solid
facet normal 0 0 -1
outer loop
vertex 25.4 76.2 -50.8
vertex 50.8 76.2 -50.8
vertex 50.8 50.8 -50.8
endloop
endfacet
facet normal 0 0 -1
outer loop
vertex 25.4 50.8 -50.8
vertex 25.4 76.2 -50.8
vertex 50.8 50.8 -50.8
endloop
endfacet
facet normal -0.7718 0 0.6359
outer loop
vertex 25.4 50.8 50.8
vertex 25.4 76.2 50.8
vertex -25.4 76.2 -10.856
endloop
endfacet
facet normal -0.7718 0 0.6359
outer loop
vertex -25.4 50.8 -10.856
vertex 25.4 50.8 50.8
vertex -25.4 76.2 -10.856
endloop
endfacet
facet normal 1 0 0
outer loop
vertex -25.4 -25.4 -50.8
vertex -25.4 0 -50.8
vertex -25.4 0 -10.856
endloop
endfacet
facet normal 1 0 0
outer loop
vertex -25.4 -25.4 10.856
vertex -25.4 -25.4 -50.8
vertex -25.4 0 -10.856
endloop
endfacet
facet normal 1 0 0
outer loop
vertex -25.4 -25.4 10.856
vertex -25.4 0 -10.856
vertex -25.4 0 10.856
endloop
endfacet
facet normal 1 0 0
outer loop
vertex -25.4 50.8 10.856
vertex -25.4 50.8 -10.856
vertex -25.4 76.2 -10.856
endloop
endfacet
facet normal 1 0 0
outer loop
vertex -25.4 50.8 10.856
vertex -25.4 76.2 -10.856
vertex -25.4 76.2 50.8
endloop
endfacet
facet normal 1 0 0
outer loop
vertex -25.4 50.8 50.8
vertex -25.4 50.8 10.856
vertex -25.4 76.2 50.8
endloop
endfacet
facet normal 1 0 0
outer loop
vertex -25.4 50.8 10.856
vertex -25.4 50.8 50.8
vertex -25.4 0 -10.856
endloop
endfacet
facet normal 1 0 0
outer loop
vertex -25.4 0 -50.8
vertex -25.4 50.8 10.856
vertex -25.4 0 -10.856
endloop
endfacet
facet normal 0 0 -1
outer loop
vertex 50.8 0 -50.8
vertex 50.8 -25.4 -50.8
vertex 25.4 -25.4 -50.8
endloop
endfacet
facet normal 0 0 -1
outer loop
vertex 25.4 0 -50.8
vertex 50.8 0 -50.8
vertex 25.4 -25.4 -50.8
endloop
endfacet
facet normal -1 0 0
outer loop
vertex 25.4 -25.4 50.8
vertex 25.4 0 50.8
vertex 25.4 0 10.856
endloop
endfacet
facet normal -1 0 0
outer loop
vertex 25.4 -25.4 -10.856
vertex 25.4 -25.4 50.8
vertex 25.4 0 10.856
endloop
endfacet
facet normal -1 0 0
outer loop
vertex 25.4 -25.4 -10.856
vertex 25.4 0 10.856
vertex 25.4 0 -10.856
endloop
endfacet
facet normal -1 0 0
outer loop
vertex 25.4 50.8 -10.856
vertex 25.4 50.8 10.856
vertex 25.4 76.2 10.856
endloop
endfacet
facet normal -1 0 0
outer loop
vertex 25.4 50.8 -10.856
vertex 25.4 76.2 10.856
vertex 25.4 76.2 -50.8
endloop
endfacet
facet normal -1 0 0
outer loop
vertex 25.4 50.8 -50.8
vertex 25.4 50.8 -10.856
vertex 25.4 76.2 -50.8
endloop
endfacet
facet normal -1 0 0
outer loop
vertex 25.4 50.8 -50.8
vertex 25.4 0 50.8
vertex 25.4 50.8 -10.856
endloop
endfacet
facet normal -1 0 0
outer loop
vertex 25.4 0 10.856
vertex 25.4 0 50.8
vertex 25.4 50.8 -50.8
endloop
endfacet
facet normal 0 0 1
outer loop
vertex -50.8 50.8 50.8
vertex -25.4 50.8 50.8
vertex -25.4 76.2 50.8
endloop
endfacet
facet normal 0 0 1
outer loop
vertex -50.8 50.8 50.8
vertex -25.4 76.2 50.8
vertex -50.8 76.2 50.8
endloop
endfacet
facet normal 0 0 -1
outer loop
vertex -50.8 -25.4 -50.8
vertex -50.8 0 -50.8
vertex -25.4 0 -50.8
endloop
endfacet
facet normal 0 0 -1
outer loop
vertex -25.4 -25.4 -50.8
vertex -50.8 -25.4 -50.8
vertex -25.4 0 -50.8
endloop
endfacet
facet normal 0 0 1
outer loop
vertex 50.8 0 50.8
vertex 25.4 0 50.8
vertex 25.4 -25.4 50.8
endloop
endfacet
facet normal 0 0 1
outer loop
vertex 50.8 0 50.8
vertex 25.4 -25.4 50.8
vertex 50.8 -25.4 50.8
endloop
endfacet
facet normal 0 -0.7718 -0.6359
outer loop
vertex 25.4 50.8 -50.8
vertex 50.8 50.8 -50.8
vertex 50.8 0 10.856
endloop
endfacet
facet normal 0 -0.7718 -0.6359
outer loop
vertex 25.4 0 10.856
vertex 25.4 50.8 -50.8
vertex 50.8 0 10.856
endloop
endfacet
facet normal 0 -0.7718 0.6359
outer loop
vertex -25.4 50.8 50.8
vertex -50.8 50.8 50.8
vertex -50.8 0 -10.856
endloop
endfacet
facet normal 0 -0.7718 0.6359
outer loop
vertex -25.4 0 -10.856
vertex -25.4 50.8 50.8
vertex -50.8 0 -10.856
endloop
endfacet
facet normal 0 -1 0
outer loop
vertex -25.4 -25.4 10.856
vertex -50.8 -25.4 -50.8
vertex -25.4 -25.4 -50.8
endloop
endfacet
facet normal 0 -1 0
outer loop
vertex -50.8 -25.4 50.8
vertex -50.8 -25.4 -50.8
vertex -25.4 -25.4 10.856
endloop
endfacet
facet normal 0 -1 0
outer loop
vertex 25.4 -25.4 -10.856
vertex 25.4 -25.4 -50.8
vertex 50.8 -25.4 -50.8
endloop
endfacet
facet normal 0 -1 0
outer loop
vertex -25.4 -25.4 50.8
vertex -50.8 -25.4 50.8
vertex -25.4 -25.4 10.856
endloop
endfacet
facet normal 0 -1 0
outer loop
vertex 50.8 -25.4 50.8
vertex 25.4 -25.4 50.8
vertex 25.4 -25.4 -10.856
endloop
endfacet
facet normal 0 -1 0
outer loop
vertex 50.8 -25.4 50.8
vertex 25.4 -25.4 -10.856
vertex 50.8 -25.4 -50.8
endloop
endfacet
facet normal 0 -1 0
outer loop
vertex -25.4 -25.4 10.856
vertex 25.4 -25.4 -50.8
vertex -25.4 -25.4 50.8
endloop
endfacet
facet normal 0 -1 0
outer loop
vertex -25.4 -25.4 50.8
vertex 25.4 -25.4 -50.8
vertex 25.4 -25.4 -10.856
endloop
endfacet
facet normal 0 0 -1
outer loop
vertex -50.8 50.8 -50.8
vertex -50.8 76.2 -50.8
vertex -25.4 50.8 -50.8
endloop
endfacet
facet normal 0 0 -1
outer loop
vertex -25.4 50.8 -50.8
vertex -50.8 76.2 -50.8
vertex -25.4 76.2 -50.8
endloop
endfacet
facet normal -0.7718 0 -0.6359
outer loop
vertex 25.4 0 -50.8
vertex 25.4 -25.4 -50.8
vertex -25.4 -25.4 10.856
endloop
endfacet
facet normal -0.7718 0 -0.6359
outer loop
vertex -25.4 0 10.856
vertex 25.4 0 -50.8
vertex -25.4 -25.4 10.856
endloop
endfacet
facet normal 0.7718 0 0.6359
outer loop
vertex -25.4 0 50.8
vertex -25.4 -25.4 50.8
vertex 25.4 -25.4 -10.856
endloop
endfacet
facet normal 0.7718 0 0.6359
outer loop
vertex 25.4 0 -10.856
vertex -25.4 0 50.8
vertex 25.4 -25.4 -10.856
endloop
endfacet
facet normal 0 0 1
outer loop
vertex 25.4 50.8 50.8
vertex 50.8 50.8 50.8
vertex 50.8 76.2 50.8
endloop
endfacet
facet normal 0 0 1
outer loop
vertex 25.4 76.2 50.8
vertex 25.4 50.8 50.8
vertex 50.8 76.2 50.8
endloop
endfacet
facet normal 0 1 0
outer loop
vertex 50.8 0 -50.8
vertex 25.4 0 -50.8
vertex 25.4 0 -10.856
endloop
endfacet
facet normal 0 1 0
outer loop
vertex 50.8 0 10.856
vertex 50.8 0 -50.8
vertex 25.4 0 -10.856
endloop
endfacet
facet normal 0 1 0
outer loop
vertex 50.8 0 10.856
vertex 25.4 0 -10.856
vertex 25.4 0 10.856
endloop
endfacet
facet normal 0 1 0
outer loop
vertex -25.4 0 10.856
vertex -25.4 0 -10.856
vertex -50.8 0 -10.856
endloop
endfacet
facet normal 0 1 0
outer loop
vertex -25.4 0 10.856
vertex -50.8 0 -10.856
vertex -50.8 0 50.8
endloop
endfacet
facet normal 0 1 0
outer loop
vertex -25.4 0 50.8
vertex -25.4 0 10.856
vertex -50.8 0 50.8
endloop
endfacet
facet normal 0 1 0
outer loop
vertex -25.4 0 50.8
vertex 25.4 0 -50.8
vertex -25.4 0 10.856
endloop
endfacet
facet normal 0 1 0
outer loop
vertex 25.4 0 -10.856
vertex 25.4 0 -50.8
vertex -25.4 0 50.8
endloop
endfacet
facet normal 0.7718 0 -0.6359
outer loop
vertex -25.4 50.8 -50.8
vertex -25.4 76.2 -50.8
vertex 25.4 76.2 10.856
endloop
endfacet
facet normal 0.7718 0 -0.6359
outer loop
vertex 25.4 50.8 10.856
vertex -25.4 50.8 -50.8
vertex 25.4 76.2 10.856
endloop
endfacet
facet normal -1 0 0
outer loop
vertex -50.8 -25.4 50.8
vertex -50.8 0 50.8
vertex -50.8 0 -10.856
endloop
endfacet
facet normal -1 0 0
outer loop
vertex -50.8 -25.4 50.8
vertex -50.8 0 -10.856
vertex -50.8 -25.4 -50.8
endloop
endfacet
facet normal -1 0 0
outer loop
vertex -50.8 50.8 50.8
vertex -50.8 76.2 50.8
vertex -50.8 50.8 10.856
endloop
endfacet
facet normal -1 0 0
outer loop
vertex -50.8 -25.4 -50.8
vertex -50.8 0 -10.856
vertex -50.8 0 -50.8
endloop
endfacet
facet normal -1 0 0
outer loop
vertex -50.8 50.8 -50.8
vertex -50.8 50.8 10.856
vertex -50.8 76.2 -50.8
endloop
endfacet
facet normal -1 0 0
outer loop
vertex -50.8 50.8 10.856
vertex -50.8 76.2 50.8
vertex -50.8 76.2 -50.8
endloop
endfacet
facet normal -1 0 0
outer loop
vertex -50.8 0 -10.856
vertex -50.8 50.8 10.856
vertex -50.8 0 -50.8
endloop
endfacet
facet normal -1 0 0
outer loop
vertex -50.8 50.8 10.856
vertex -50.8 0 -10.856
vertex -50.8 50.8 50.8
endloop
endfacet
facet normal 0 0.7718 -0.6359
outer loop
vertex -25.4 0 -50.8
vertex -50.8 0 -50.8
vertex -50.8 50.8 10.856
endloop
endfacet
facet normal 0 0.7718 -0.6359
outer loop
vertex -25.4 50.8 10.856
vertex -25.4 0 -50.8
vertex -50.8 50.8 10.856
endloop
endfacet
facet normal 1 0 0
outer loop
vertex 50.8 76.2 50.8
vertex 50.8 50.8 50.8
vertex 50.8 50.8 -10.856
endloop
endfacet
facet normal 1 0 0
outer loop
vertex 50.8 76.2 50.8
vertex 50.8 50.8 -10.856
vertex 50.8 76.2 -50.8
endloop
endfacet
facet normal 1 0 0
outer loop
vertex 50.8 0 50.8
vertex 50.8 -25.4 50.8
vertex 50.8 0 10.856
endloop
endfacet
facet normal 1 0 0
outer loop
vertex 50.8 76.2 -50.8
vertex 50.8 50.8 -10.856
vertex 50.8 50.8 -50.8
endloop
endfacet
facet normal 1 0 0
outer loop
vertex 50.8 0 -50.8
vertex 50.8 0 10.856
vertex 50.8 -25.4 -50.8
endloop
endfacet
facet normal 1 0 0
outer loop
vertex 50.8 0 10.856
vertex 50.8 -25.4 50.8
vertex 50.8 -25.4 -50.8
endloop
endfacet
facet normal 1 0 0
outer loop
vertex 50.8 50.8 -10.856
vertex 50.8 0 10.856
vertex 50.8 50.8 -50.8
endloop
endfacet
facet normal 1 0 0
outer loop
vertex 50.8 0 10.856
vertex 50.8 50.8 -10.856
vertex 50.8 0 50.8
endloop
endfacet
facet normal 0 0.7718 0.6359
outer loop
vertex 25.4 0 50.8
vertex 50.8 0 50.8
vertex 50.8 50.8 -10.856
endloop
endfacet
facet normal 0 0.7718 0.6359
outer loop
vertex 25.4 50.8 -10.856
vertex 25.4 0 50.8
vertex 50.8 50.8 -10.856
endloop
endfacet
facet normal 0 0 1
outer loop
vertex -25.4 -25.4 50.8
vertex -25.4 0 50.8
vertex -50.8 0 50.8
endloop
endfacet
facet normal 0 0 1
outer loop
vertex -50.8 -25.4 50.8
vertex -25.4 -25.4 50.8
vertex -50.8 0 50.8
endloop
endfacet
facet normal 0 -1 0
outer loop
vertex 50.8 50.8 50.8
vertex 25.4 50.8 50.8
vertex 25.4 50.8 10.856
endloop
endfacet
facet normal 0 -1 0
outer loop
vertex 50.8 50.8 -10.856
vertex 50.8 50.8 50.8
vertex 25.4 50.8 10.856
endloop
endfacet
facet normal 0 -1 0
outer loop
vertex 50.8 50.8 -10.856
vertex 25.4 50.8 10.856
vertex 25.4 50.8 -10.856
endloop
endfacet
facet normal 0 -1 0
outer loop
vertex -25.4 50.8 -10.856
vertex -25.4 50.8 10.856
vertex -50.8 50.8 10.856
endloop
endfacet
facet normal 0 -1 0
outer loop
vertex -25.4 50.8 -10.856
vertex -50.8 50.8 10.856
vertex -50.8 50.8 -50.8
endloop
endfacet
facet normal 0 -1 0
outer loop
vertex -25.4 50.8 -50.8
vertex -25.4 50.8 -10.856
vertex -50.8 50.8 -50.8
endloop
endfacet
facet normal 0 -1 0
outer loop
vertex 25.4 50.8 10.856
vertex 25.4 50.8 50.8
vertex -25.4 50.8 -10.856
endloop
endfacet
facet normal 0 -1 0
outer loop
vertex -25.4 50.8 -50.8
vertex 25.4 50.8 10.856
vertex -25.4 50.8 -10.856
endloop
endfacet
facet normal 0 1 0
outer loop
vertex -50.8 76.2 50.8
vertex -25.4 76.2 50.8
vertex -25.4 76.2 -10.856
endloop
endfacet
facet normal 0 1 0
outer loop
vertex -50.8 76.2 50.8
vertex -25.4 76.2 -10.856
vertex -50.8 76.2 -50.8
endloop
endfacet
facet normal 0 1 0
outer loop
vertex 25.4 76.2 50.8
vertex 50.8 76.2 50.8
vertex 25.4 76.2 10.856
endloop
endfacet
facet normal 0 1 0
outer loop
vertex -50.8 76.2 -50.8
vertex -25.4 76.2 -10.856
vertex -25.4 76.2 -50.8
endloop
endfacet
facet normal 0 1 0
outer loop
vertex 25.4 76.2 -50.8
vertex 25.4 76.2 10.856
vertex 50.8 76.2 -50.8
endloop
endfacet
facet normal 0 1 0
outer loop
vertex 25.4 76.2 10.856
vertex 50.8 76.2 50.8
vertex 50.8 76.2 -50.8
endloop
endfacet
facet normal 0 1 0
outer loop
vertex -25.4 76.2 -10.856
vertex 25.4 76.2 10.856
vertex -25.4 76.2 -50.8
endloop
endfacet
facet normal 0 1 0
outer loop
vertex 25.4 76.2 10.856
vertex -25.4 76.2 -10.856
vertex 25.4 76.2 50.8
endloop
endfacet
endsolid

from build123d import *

# Parameters (mm, degrees)
F0_W      = 101.6
F0_H      = 101.6
F1_DEPTH  = 25.4
F3_DEPTH  = 25.401
F5_DEPTH  = 76.2
F7_DEPTH  = 25.4
F9_DEPTH  = 76.2
F11_DEPTH = 25.4
F13_DEPTH = 50.8
F15_DEPTH = 25.4


with BuildPart() as f1:
    # F0 (on Front) → F1 (new body)
    with BuildSketch(Plane.XZ):
        Rectangle(F0_W, F0_H)
    extrude(amount=F1_DEPTH)

    # F2 (on face) → F3 (cut, through all)
    with BuildSketch(Plane.XZ.offset(25.4)):
        Polygon((25.4, 50.8), (-25.4, 50.8), (25.4, -10.855978), align=None)
        Polygon((-25.4, 10.855978), (-25.4, -50.8), (25.4, -50.8), align=None)
    extrude(amount=-F3_DEPTH, mode=Mode.SUBTRACT)

    # F4 (on face) → F5 (join)
    with BuildSketch(Plane(origin=(0, 0, 0), x_dir=(-1, 0, 0), z_dir=(0, 1, 0))):
        Polygon((-25.4, 50.8), (-50.8, 50.8), (-50.8, -50.8), (-25.4, -50.8), (-25.4, -10.855978), align=None)
    extrude(amount=F5_DEPTH)

    # F6 (on face) → F7 (cut)
    with BuildSketch(Plane.YZ.offset(50.8)):
        Polygon((50.8, 50.8), (0, 50.8), (50.8, -10.855978), align=None)
        Polygon((0, 10.855978), (0, -50.8), (50.8, -50.8), align=None)
    extrude(amount=-F7_DEPTH, mode=Mode.SUBTRACT)

    # F8 (on face) → F9 (join)
    with BuildSketch(Plane(origin=(25.4, 0, 0), x_dir=(0, -1, 0), z_dir=(-1, 0, 0))):
        Polygon((-50.8, -10.855978), (-50.8, 50.8), (-76.2, 50.8), (-76.2, -50.8), (-50.8, -50.8), align=None)
    extrude(amount=F9_DEPTH)

    # F10 (on face) → F11 (cut)
    with BuildSketch(Plane(origin=(0, 76.2, 0), x_dir=(-1, 0, 0), z_dir=(0, 1, 0))):
        Polygon((25.4, 50.8), (-25.4, 50.8), (25.4, -10.855978), align=None)
        Polygon((-25.4, 10.855978), (-25.4, -50.8), (25.4, -50.8), align=None)
    extrude(amount=-F11_DEPTH, mode=Mode.SUBTRACT)

    # F12 (on face) → F13 (join)
    with BuildSketch(Plane.XZ.offset(-50.8)):
        Polygon((-25.4, -10.855978), (-25.4, 50.8), (-50.8, 50.8), (-50.8, -50.8), (-25.4, -50.8), align=None)
    extrude(amount=F13_DEPTH)

    # F14 (on face) → F15 (cut)
    with BuildSketch(Plane(origin=(-50.8, 0, 0), x_dir=(0, -1, 0), z_dir=(-1, 0, 0))):
        Polygon((0, 50.8), (-50.8, 50.8), (0, -10.855978), align=None)
        Polygon((-50.8, 10.855978), (-50.8, -50.8), (0, -50.8), align=None)
    extrude(amount=-F15_DEPTH, mode=Mode.SUBTRACT)


solid = f1.part
